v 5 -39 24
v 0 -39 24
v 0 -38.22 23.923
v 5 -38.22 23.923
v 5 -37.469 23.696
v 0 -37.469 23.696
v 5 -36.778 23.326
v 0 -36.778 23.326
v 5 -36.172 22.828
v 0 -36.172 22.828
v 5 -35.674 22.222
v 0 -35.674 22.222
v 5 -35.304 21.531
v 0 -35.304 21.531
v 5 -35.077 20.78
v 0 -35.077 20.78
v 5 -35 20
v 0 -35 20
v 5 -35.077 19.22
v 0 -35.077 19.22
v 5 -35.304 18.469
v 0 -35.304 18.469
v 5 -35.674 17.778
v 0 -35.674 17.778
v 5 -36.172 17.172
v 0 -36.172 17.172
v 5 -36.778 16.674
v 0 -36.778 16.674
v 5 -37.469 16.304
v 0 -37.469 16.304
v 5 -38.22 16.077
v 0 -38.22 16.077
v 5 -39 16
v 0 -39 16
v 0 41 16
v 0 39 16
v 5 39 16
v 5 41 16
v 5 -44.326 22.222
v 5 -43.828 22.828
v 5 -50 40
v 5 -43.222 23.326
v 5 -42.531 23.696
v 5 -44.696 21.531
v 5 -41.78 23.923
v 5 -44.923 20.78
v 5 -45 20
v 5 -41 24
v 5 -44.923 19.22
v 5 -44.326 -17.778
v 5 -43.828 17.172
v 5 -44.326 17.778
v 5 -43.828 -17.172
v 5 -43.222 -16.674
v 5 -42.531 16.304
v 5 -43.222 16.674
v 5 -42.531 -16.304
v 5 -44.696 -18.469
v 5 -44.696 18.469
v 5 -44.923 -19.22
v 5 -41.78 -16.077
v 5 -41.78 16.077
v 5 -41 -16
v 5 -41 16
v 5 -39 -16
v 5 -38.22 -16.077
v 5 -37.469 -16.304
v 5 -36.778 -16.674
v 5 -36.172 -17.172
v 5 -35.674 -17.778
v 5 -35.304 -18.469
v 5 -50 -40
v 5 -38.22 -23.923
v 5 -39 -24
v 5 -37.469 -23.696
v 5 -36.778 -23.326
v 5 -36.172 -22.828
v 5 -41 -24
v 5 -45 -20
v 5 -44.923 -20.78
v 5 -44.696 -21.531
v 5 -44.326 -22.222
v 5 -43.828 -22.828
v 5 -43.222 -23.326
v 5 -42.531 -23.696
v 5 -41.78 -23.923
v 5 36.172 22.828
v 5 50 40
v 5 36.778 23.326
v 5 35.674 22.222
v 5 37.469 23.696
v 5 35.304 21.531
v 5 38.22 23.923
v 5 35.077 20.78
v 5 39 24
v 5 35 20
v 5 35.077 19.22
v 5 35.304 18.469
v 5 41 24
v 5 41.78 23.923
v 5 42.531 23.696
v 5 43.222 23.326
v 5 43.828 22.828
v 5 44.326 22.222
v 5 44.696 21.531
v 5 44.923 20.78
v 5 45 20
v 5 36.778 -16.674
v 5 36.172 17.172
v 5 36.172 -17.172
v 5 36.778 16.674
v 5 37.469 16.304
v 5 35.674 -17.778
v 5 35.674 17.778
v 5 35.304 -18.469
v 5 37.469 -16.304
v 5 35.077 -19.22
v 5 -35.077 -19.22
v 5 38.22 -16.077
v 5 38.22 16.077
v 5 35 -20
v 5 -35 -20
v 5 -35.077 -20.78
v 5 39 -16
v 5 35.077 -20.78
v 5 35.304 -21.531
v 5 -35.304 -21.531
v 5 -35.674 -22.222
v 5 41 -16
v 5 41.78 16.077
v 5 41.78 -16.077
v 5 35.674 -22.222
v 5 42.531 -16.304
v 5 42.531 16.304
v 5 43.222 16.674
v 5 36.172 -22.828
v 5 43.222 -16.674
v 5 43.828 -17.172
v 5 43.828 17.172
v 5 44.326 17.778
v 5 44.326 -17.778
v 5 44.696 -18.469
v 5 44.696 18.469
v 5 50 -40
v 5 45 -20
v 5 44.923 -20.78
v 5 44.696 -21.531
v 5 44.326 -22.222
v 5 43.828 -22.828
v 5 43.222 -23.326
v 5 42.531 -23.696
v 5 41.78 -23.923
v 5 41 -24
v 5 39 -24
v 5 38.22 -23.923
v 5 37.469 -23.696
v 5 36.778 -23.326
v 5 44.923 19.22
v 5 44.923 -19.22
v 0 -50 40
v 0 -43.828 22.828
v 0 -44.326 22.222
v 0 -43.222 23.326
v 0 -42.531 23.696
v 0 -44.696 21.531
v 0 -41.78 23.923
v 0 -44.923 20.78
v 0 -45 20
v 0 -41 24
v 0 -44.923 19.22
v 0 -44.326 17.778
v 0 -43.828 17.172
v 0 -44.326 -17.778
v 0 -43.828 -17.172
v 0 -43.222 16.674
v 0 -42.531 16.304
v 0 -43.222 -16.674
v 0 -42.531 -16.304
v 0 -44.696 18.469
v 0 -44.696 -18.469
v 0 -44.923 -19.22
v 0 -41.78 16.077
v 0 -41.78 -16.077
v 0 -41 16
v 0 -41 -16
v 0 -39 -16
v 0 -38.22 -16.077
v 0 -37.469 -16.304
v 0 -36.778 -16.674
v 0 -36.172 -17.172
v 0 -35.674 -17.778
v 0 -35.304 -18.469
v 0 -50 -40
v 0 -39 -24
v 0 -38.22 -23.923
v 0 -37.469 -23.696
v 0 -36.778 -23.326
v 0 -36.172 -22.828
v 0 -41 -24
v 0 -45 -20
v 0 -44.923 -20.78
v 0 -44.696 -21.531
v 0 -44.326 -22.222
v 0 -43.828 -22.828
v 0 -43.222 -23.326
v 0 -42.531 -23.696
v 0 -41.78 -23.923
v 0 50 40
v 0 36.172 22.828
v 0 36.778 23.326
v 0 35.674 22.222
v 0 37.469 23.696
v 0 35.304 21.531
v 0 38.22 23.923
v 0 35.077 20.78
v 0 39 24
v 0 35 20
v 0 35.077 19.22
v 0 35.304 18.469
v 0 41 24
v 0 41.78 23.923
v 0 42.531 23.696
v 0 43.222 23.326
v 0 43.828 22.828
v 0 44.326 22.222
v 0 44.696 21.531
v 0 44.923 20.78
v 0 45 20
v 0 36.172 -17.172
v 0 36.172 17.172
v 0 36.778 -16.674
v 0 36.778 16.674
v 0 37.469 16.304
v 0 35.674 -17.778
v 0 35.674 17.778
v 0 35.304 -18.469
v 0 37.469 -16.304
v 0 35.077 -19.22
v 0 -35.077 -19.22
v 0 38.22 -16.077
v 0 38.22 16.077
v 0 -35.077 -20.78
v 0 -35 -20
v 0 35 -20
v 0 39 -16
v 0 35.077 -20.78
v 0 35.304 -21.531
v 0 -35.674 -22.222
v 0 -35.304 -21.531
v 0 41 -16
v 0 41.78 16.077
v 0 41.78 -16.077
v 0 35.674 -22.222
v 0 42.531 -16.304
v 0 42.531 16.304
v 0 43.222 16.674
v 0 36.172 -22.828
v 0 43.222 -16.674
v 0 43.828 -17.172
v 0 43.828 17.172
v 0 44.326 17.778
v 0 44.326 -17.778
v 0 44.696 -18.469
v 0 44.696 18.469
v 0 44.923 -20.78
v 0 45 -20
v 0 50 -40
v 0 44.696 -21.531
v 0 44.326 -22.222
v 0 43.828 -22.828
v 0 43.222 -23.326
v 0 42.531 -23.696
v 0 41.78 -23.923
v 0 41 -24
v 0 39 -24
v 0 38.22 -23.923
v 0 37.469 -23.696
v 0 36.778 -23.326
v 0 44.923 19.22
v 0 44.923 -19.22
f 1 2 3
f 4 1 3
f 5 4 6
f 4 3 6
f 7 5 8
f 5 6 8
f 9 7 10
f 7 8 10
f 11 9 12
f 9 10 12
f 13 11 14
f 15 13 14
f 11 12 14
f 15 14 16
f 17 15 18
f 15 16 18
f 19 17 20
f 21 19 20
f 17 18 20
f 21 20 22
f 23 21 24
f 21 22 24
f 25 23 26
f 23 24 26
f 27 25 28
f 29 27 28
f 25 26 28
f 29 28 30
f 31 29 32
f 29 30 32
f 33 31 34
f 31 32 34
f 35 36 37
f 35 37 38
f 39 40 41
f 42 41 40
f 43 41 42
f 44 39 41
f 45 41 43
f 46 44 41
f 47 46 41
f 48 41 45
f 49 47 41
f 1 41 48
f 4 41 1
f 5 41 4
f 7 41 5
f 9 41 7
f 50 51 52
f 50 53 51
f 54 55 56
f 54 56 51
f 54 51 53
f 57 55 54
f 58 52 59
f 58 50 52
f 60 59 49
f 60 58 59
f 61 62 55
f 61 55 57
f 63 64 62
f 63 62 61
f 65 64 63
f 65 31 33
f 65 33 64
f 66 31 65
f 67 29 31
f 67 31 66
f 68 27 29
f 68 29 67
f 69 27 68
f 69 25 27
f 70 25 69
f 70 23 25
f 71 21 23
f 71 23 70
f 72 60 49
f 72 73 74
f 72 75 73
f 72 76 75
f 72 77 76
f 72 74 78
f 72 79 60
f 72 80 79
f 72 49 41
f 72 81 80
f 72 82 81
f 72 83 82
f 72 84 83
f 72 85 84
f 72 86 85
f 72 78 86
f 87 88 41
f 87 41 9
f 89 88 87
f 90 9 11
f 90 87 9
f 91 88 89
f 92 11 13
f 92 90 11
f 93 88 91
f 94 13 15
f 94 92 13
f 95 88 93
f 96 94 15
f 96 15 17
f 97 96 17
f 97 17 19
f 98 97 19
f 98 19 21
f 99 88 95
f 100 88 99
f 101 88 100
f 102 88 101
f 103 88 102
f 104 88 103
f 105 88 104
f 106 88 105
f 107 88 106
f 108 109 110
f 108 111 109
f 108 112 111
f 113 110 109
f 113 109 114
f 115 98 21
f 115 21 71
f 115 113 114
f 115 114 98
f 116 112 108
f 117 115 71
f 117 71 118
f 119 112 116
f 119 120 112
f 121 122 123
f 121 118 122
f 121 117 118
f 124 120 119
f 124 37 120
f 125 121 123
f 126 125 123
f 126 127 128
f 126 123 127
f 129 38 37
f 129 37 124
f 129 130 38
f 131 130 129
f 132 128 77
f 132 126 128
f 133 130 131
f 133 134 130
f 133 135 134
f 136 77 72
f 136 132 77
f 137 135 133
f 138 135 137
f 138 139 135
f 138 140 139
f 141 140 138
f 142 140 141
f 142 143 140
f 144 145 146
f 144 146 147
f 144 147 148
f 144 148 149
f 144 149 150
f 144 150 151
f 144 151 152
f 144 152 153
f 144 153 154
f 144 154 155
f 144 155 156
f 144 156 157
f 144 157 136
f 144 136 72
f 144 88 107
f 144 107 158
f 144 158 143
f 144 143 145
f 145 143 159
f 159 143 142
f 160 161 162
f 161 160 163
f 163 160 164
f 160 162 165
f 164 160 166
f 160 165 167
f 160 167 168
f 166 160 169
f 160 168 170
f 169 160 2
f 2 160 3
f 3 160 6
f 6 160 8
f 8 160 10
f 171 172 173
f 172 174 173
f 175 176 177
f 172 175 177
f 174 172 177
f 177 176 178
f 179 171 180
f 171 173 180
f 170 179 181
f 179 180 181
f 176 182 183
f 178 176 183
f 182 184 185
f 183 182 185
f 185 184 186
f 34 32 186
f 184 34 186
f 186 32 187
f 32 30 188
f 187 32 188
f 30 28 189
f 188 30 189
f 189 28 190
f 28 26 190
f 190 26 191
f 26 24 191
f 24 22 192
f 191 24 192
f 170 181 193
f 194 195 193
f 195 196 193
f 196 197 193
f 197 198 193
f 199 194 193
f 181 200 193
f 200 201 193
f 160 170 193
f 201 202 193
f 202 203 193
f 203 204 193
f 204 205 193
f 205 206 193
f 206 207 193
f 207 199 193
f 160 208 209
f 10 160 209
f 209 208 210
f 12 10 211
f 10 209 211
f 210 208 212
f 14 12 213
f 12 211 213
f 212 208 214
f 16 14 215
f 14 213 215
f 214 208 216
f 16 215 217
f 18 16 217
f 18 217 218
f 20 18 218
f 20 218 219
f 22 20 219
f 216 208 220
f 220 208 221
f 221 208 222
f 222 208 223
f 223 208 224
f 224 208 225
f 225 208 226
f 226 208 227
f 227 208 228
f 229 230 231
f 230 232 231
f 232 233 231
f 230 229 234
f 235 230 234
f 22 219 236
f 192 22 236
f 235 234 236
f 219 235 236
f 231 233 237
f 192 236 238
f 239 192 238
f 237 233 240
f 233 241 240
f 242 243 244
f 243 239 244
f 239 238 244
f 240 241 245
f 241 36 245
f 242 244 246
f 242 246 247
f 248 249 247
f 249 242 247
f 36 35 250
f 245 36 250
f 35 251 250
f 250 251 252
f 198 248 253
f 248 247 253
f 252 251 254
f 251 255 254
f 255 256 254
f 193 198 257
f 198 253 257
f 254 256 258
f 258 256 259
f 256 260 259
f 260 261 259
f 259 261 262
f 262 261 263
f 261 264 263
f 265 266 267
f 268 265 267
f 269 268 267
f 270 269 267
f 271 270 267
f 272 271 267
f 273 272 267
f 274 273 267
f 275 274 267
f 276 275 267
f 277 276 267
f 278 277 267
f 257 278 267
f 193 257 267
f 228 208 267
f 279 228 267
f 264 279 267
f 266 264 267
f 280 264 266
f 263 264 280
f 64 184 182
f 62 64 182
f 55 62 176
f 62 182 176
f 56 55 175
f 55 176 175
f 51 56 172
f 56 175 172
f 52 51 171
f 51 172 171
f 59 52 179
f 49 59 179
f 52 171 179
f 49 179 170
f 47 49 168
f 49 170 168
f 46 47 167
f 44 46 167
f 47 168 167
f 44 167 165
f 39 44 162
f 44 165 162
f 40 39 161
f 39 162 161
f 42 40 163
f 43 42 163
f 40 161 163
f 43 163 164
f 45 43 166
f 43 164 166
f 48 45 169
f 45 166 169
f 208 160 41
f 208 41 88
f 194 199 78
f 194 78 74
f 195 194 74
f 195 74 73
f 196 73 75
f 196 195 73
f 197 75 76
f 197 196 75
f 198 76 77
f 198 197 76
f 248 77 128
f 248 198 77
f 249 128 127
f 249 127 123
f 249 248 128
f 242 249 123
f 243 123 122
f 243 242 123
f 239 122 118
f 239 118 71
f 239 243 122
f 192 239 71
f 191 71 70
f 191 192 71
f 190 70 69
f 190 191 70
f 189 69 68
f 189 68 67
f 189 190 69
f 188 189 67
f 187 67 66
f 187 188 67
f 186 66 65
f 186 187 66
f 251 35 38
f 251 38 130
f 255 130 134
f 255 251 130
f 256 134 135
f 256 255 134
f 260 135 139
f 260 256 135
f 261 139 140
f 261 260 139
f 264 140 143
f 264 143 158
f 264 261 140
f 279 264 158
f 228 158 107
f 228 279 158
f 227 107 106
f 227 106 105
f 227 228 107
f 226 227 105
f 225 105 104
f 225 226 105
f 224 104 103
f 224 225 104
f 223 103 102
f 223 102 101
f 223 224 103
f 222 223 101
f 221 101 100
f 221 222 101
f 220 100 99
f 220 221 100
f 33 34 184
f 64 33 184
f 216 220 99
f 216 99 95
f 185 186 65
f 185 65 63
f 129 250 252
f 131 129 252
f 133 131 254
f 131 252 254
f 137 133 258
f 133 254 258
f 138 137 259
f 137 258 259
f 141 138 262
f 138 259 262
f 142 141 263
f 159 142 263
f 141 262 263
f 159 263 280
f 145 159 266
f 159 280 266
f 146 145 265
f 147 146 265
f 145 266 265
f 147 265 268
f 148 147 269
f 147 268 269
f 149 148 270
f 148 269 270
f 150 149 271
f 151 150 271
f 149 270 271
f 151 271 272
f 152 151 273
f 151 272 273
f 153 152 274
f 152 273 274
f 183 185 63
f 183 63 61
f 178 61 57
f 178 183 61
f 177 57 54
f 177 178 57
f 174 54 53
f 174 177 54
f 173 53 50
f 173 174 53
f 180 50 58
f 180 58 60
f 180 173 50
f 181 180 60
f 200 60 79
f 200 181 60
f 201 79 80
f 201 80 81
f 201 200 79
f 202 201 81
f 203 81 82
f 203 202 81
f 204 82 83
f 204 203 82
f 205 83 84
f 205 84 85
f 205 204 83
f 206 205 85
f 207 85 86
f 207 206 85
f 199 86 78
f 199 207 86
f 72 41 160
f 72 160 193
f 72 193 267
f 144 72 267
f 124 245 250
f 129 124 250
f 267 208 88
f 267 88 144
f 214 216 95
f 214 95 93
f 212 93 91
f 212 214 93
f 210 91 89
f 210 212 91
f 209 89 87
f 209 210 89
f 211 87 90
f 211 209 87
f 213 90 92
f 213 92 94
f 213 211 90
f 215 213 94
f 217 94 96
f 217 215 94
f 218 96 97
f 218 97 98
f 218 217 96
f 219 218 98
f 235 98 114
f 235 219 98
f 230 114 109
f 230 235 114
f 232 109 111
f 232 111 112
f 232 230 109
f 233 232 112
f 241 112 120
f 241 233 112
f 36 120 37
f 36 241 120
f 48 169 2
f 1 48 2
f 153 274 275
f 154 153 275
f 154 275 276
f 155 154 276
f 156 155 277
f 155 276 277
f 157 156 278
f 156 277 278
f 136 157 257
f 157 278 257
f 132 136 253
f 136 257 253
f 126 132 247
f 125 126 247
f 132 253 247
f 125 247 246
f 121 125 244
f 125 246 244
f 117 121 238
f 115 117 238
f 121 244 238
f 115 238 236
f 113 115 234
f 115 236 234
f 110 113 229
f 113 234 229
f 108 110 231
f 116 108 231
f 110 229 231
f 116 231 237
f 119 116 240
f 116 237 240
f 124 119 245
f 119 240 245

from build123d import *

# Parameters (mm, degrees)
SKETCH1_W           = 80
SKETCH1_H           = 100
SKETCH1_R           = 21.5
SKETCH1_R_2         = 14
SKETCH1_R_3         = 2
BOSS_EXTRUDE1_DEPTH = 5
SKETCH3_W           = 80
SKETCH3_H           = 55.127756358
CUT_EXTRUDE1_DEPTH  = 6


with BuildPart() as part:
    # Sketch1 → Boss-Extrude1 (new body)
    with BuildSketch(Plane(origin=(0, 0, 0), x_dir=(0, 0, -1), z_dir=(1, 0, 0))):
        Rectangle(SKETCH1_W, SKETCH1_H)
        with BuildLine():
            ThreePointArc((24, -39), (20, -35), (16, -39))
            Line((16, -39), (16, -41))
            ThreePointArc((16, -41), (20, -45), (24, -41))
            Line((24, -41), (24, -39))
        make_face(mode=Mode.SUBTRACT)
        with BuildLine():
            ThreePointArc((-24, 39), (-20, 35), (-16, 39))
            Line((-16, 39), (-16, 41))
            ThreePointArc((-16, 41), (-20, 45), (-24, 41))
            Line((-24, 41), (-24, 39))
        make_face(mode=Mode.SUBTRACT)
        with BuildLine():
            Line((24, 41), (24, 39))
            ThreePointArc((24, 39), (20, 35), (16, 39))
            Line((16, 39), (16, 41))
            ThreePointArc((16, 41), (20, 45), (24, 41))
        make_face(mode=Mode.SUBTRACT)
        with BuildLine():
            Line((-24, -41), (-24, -39))
            ThreePointArc((-24, -39), (-20, -35), (-16, -39))
            Line((-16, -39), (-16, -41))
            ThreePointArc((-16, -41), (-20, -45), (-24, -41))
        make_face(mode=Mode.SUBTRACT)
        with BuildLine():
            Line((40, -50), (-40, -50))
            Line((-40, -50), (-18.452584301, -86.034134882))
            ThreePointArc((-18.452584301, -86.034134882), (-5.72361064, -54.275852702), (21.5, -75))
            ThreePointArc((21.5, -75), (20.724147298, -80.72361064), (18.452584301, -86.034134882))
            Line((18.452584301, -86.034134882), (40, -50))
        make_face()
        with Locations((0, -75)):
            Circle(SKETCH1_R)
        with Locations((0, -75)):
            Circle(SKETCH1_R_2, mode=Mode.SUBTRACT)
        with Locations((17.5, -75)):
            Circle(SKETCH1_R_3, mode=Mode.SUBTRACT)
        with Locations((0, -92.5)):
            Circle(SKETCH1_R_3, mode=Mode.SUBTRACT)
        with Locations((-17.5, -75)):
            Circle(SKETCH1_R_3, mode=Mode.SUBTRACT)
        with Locations((0, -57.5)):
            Circle(SKETCH1_R_3, mode=Mode.SUBTRACT)
    extrude(amount=BOSS_EXTRUDE1_DEPTH)

    # Sketch3 → Cut-Extrude1 (cut, through all)
    with BuildSketch(Plane(origin=(5, 0, 0), x_dir=(0, 0, -1), z_dir=(1, 0, 0))):
        with Locations((0, -77.563878179)):
            Rectangle(SKETCH3_W, SKETCH3_H)
    extrude(amount=-CUT_EXTRUDE1_DEPTH, mode=Mode.SUBTRACT)


solid = part.part
